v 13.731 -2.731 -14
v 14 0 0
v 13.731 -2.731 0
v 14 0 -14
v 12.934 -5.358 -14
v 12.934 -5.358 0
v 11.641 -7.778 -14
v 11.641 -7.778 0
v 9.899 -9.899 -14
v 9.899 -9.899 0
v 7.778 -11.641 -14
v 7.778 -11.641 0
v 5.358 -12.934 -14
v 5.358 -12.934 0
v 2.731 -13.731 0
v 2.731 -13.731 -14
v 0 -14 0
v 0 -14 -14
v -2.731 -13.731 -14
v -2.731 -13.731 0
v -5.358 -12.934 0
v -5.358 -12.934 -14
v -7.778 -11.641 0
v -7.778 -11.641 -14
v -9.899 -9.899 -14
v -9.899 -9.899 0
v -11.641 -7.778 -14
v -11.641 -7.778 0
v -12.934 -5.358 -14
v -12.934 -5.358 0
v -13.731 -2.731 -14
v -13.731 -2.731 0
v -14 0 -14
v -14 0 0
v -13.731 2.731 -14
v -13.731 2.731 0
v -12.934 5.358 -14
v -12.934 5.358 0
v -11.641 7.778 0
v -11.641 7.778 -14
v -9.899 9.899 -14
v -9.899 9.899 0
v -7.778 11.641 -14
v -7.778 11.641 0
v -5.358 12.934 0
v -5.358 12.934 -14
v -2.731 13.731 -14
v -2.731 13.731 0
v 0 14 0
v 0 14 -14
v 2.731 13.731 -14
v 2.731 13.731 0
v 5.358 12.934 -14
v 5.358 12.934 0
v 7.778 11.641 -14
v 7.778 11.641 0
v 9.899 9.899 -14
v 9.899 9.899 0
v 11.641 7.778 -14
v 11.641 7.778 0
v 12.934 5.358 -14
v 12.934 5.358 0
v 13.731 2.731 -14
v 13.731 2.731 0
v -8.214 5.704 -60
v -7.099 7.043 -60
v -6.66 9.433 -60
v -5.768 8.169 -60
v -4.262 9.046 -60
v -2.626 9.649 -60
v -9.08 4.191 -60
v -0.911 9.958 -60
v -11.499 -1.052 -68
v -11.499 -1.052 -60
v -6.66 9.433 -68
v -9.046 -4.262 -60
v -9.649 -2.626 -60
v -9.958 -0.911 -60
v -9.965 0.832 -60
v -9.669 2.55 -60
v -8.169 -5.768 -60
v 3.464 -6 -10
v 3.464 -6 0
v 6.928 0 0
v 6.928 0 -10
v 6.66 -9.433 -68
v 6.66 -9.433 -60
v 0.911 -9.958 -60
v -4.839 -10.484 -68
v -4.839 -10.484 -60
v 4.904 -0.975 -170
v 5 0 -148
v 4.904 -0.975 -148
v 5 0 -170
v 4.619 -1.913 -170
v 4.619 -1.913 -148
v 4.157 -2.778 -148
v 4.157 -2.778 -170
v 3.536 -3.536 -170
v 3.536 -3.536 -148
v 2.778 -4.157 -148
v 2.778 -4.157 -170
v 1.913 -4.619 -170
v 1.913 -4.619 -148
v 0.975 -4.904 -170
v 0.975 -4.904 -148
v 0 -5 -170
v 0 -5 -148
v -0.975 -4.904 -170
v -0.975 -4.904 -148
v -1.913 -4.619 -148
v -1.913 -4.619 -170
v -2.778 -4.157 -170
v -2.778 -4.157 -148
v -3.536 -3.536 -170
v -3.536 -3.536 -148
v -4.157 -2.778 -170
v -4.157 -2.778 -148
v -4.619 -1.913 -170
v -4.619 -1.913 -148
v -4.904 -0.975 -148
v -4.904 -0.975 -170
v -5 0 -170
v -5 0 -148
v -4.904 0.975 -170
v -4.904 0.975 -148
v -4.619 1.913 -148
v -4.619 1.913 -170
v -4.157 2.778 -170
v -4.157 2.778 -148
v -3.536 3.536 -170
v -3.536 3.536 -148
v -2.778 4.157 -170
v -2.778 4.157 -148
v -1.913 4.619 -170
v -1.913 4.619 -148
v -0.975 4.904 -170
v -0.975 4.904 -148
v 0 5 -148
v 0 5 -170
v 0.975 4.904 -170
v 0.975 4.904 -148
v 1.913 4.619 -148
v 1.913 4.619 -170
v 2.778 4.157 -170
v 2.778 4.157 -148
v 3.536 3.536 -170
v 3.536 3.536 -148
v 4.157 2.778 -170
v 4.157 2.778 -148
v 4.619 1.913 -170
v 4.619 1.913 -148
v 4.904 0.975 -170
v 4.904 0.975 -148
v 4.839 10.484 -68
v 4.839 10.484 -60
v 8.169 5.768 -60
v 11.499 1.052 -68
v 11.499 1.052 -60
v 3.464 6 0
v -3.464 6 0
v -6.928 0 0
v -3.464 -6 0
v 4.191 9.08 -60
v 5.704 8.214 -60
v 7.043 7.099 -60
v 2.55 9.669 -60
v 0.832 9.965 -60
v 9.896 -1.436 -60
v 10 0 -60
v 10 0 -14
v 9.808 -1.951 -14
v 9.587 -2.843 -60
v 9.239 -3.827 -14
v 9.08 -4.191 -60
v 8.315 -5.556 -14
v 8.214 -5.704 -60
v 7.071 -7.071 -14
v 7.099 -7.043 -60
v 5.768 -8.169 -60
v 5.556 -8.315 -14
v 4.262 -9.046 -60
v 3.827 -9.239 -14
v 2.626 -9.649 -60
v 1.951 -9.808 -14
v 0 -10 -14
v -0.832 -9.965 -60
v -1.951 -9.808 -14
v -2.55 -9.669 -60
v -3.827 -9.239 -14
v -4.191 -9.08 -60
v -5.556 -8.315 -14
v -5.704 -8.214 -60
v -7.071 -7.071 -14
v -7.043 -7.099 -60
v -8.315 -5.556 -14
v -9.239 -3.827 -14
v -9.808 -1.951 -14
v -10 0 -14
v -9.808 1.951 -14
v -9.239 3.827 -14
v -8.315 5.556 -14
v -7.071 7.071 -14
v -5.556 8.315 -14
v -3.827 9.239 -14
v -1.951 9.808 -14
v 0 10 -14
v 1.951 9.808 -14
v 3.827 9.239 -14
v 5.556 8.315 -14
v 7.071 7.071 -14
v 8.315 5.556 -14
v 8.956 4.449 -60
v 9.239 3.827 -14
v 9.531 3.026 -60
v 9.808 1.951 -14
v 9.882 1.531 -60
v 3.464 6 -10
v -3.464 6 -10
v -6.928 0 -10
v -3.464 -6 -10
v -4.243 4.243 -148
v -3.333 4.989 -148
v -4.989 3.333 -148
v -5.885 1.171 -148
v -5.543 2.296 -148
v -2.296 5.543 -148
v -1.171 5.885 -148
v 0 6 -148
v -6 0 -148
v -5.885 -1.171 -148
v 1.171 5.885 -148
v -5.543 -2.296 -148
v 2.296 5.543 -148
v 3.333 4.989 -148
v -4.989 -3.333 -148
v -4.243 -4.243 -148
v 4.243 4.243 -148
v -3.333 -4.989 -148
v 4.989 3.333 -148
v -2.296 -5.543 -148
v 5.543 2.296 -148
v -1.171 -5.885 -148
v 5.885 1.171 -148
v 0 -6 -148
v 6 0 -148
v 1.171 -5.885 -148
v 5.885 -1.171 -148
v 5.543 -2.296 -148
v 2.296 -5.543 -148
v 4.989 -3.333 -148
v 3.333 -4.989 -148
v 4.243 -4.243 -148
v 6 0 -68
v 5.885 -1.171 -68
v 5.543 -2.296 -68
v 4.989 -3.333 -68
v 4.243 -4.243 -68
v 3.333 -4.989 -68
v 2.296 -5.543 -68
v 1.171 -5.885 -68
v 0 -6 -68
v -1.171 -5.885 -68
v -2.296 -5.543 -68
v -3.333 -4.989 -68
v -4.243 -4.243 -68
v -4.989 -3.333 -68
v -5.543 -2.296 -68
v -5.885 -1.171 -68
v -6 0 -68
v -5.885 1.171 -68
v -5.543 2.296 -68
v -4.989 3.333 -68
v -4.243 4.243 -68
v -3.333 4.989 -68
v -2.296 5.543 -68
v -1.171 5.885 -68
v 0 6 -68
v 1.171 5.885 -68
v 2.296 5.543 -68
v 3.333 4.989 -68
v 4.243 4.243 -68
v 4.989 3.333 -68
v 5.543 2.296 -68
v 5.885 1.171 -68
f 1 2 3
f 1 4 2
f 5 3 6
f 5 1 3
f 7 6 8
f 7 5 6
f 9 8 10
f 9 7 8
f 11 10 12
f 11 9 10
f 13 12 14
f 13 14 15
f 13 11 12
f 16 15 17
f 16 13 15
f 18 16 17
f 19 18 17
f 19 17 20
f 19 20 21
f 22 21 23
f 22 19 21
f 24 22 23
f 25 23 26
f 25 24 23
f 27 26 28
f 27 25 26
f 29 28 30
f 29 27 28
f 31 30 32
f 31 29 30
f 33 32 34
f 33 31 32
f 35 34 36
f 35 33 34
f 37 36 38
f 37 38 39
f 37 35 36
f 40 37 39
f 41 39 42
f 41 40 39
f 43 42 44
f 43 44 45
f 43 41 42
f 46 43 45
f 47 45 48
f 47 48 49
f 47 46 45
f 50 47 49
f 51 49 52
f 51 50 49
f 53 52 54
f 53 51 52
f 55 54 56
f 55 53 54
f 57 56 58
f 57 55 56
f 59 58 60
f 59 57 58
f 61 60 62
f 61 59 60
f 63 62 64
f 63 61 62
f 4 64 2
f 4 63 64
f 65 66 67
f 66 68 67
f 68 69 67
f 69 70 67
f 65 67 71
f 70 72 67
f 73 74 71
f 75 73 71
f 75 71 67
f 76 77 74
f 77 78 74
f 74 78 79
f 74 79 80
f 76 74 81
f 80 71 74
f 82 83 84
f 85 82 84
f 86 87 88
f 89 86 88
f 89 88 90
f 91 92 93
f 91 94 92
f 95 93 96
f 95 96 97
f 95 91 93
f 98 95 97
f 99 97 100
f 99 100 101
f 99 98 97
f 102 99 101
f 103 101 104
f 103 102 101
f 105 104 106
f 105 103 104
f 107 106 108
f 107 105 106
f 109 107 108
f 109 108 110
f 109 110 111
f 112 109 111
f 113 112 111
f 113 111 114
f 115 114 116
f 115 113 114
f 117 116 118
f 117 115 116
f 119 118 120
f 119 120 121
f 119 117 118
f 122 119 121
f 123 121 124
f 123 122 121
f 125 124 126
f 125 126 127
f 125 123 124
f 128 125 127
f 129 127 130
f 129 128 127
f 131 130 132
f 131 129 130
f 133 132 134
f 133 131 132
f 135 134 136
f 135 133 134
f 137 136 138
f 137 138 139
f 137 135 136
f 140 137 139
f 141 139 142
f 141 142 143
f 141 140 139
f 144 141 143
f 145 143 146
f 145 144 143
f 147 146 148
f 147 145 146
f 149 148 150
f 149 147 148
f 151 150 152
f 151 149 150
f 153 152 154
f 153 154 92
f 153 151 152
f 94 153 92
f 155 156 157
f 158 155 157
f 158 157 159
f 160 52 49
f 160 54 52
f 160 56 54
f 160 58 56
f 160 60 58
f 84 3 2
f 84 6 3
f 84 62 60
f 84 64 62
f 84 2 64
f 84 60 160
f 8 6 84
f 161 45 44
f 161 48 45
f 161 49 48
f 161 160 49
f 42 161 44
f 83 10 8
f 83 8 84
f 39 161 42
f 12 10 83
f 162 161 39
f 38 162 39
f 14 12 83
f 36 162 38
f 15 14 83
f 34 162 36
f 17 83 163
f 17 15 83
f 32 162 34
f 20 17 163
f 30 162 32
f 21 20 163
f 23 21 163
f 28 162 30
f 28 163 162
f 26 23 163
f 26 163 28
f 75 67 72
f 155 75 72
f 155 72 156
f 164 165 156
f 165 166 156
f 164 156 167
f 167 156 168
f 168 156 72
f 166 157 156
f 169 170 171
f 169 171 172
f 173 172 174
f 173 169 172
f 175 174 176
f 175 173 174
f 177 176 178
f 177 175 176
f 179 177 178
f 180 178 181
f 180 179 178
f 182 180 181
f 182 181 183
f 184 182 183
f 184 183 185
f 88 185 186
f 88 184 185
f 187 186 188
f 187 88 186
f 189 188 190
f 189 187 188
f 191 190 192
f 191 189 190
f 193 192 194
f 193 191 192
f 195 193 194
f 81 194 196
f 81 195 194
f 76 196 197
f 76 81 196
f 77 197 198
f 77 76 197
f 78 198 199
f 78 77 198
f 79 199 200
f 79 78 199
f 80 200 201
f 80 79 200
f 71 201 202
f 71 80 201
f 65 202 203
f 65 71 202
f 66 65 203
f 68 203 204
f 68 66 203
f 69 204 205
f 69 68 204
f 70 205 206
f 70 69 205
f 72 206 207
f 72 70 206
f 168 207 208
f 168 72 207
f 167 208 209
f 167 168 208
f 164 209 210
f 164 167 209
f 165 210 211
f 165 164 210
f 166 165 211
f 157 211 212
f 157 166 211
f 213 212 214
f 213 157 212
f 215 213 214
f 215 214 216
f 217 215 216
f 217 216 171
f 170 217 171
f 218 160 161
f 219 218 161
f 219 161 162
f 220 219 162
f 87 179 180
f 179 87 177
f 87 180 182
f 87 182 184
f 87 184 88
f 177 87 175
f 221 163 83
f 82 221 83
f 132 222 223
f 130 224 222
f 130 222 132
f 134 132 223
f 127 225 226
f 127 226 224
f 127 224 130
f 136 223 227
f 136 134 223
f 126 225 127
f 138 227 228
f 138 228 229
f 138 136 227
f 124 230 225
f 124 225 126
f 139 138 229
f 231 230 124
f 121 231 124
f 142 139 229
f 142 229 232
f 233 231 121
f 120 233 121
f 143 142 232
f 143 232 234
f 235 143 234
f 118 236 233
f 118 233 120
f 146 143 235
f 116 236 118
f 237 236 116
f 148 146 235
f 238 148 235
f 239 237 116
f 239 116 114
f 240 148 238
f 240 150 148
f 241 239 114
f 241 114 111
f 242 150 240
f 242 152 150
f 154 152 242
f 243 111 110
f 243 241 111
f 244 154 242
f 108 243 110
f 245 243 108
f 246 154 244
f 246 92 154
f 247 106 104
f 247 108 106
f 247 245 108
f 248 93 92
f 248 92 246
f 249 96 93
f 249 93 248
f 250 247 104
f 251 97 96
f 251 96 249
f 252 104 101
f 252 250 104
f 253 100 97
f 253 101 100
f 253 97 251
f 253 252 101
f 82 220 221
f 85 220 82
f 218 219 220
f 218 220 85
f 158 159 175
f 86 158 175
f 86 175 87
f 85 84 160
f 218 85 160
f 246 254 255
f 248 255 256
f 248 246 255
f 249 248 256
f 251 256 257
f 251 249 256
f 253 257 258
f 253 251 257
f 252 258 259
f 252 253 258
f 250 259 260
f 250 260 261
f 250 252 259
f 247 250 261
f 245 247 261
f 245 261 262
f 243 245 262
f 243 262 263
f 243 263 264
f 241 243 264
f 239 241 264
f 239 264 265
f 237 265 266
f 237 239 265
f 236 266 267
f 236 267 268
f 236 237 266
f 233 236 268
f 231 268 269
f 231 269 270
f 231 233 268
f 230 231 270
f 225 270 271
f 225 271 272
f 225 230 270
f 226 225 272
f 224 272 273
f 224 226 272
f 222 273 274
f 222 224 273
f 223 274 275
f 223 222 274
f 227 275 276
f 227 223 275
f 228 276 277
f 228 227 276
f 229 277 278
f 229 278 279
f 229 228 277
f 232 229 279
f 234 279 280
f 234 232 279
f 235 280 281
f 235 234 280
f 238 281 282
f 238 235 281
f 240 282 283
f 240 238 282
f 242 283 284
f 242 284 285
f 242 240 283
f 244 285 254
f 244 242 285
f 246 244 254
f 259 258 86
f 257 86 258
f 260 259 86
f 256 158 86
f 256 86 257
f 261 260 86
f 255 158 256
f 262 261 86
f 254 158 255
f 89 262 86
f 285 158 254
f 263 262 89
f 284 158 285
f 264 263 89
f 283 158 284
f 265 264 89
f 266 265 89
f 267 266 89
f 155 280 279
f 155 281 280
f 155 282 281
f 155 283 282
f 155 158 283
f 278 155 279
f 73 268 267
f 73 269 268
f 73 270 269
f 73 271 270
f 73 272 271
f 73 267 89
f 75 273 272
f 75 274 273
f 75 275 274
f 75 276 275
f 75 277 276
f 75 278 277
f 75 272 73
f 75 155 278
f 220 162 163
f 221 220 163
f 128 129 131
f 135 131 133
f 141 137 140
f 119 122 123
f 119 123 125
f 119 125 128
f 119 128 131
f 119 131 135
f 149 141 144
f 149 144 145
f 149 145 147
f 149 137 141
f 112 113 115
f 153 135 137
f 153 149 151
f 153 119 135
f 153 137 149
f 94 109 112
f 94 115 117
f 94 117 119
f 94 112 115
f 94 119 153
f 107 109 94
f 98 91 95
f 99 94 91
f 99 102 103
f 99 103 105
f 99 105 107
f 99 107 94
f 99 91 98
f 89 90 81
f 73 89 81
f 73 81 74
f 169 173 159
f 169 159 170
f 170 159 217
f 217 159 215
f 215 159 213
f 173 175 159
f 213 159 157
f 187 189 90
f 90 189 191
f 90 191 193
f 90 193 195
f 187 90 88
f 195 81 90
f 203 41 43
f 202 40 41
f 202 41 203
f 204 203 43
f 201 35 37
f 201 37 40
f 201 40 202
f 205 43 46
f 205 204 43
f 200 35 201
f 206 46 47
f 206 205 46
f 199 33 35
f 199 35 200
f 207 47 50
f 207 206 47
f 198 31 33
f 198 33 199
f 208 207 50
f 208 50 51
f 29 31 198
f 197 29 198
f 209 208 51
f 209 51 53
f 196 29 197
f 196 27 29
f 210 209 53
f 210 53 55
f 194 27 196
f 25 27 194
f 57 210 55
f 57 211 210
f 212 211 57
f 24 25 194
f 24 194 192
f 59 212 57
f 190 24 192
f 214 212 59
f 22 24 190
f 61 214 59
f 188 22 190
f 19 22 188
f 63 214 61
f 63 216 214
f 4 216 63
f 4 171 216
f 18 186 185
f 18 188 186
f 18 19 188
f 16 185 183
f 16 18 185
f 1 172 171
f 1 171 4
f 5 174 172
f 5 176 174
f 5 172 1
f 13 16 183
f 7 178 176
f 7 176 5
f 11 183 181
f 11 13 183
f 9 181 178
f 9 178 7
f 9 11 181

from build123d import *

# Parameters (mm, degrees)
ENL_V_MAT_EXTRU_1_DEPTH = 10
BOSS_EXTRU_1_DEPTH      = 8


with BuildPart() as part:
    # Esquisse2 → Base-Révolution (revolve)
    with BuildSketch(Plane(origin=(0, 0, 0), x_dir=(0, 0, -1), z_dir=(1, 0, 0)), mode=Mode.PRIVATE) as base_r_volution_sk:
        Polygon((0, 0), (0, 14), (14, 14), (14, 10), (60, 10), (60, 6), (148, 6), (148, 5), (170, 5), (170, 0), align=None)
    revolve(base_r_volution_sk.sketch.rotate(Axis((0, 0, 67), (0, 0, -1)), 90), axis=Axis((0, 0, 67), (0, 0, -1)))

    # Esquisse3 → Enlèv. mat.-Extru.1 (cut)
    with BuildSketch(Plane.XY):
        Polygon((6.92820323, 0), (3.464101615, 6), (-3.464101615, 6), (-6.92820323, 0), (-3.464101615, -6), (3.464101615, -6), align=None)
    extrude(amount=-ENL_V_MAT_EXTRU_1_DEPTH, mode=Mode.SUBTRACT)

    # Esquisse7 → Boss.-Extru.1 (add)
    with BuildSketch(Plane(origin=(0, 0, -60), x_dir=(-1, 0, 0), z_dir=(0, 0, -1))):
        Polygon((4.838867031, -10.484211901), (11.499027361, -1.051524176), (6.660160329, 9.432687725), (-4.838867031, 10.484211901), (-11.499027361, 1.051524176), (-6.660160329, -9.432687725), align=None)
    extrude(amount=BOSS_EXTRU_1_DEPTH)


solid = part.part
